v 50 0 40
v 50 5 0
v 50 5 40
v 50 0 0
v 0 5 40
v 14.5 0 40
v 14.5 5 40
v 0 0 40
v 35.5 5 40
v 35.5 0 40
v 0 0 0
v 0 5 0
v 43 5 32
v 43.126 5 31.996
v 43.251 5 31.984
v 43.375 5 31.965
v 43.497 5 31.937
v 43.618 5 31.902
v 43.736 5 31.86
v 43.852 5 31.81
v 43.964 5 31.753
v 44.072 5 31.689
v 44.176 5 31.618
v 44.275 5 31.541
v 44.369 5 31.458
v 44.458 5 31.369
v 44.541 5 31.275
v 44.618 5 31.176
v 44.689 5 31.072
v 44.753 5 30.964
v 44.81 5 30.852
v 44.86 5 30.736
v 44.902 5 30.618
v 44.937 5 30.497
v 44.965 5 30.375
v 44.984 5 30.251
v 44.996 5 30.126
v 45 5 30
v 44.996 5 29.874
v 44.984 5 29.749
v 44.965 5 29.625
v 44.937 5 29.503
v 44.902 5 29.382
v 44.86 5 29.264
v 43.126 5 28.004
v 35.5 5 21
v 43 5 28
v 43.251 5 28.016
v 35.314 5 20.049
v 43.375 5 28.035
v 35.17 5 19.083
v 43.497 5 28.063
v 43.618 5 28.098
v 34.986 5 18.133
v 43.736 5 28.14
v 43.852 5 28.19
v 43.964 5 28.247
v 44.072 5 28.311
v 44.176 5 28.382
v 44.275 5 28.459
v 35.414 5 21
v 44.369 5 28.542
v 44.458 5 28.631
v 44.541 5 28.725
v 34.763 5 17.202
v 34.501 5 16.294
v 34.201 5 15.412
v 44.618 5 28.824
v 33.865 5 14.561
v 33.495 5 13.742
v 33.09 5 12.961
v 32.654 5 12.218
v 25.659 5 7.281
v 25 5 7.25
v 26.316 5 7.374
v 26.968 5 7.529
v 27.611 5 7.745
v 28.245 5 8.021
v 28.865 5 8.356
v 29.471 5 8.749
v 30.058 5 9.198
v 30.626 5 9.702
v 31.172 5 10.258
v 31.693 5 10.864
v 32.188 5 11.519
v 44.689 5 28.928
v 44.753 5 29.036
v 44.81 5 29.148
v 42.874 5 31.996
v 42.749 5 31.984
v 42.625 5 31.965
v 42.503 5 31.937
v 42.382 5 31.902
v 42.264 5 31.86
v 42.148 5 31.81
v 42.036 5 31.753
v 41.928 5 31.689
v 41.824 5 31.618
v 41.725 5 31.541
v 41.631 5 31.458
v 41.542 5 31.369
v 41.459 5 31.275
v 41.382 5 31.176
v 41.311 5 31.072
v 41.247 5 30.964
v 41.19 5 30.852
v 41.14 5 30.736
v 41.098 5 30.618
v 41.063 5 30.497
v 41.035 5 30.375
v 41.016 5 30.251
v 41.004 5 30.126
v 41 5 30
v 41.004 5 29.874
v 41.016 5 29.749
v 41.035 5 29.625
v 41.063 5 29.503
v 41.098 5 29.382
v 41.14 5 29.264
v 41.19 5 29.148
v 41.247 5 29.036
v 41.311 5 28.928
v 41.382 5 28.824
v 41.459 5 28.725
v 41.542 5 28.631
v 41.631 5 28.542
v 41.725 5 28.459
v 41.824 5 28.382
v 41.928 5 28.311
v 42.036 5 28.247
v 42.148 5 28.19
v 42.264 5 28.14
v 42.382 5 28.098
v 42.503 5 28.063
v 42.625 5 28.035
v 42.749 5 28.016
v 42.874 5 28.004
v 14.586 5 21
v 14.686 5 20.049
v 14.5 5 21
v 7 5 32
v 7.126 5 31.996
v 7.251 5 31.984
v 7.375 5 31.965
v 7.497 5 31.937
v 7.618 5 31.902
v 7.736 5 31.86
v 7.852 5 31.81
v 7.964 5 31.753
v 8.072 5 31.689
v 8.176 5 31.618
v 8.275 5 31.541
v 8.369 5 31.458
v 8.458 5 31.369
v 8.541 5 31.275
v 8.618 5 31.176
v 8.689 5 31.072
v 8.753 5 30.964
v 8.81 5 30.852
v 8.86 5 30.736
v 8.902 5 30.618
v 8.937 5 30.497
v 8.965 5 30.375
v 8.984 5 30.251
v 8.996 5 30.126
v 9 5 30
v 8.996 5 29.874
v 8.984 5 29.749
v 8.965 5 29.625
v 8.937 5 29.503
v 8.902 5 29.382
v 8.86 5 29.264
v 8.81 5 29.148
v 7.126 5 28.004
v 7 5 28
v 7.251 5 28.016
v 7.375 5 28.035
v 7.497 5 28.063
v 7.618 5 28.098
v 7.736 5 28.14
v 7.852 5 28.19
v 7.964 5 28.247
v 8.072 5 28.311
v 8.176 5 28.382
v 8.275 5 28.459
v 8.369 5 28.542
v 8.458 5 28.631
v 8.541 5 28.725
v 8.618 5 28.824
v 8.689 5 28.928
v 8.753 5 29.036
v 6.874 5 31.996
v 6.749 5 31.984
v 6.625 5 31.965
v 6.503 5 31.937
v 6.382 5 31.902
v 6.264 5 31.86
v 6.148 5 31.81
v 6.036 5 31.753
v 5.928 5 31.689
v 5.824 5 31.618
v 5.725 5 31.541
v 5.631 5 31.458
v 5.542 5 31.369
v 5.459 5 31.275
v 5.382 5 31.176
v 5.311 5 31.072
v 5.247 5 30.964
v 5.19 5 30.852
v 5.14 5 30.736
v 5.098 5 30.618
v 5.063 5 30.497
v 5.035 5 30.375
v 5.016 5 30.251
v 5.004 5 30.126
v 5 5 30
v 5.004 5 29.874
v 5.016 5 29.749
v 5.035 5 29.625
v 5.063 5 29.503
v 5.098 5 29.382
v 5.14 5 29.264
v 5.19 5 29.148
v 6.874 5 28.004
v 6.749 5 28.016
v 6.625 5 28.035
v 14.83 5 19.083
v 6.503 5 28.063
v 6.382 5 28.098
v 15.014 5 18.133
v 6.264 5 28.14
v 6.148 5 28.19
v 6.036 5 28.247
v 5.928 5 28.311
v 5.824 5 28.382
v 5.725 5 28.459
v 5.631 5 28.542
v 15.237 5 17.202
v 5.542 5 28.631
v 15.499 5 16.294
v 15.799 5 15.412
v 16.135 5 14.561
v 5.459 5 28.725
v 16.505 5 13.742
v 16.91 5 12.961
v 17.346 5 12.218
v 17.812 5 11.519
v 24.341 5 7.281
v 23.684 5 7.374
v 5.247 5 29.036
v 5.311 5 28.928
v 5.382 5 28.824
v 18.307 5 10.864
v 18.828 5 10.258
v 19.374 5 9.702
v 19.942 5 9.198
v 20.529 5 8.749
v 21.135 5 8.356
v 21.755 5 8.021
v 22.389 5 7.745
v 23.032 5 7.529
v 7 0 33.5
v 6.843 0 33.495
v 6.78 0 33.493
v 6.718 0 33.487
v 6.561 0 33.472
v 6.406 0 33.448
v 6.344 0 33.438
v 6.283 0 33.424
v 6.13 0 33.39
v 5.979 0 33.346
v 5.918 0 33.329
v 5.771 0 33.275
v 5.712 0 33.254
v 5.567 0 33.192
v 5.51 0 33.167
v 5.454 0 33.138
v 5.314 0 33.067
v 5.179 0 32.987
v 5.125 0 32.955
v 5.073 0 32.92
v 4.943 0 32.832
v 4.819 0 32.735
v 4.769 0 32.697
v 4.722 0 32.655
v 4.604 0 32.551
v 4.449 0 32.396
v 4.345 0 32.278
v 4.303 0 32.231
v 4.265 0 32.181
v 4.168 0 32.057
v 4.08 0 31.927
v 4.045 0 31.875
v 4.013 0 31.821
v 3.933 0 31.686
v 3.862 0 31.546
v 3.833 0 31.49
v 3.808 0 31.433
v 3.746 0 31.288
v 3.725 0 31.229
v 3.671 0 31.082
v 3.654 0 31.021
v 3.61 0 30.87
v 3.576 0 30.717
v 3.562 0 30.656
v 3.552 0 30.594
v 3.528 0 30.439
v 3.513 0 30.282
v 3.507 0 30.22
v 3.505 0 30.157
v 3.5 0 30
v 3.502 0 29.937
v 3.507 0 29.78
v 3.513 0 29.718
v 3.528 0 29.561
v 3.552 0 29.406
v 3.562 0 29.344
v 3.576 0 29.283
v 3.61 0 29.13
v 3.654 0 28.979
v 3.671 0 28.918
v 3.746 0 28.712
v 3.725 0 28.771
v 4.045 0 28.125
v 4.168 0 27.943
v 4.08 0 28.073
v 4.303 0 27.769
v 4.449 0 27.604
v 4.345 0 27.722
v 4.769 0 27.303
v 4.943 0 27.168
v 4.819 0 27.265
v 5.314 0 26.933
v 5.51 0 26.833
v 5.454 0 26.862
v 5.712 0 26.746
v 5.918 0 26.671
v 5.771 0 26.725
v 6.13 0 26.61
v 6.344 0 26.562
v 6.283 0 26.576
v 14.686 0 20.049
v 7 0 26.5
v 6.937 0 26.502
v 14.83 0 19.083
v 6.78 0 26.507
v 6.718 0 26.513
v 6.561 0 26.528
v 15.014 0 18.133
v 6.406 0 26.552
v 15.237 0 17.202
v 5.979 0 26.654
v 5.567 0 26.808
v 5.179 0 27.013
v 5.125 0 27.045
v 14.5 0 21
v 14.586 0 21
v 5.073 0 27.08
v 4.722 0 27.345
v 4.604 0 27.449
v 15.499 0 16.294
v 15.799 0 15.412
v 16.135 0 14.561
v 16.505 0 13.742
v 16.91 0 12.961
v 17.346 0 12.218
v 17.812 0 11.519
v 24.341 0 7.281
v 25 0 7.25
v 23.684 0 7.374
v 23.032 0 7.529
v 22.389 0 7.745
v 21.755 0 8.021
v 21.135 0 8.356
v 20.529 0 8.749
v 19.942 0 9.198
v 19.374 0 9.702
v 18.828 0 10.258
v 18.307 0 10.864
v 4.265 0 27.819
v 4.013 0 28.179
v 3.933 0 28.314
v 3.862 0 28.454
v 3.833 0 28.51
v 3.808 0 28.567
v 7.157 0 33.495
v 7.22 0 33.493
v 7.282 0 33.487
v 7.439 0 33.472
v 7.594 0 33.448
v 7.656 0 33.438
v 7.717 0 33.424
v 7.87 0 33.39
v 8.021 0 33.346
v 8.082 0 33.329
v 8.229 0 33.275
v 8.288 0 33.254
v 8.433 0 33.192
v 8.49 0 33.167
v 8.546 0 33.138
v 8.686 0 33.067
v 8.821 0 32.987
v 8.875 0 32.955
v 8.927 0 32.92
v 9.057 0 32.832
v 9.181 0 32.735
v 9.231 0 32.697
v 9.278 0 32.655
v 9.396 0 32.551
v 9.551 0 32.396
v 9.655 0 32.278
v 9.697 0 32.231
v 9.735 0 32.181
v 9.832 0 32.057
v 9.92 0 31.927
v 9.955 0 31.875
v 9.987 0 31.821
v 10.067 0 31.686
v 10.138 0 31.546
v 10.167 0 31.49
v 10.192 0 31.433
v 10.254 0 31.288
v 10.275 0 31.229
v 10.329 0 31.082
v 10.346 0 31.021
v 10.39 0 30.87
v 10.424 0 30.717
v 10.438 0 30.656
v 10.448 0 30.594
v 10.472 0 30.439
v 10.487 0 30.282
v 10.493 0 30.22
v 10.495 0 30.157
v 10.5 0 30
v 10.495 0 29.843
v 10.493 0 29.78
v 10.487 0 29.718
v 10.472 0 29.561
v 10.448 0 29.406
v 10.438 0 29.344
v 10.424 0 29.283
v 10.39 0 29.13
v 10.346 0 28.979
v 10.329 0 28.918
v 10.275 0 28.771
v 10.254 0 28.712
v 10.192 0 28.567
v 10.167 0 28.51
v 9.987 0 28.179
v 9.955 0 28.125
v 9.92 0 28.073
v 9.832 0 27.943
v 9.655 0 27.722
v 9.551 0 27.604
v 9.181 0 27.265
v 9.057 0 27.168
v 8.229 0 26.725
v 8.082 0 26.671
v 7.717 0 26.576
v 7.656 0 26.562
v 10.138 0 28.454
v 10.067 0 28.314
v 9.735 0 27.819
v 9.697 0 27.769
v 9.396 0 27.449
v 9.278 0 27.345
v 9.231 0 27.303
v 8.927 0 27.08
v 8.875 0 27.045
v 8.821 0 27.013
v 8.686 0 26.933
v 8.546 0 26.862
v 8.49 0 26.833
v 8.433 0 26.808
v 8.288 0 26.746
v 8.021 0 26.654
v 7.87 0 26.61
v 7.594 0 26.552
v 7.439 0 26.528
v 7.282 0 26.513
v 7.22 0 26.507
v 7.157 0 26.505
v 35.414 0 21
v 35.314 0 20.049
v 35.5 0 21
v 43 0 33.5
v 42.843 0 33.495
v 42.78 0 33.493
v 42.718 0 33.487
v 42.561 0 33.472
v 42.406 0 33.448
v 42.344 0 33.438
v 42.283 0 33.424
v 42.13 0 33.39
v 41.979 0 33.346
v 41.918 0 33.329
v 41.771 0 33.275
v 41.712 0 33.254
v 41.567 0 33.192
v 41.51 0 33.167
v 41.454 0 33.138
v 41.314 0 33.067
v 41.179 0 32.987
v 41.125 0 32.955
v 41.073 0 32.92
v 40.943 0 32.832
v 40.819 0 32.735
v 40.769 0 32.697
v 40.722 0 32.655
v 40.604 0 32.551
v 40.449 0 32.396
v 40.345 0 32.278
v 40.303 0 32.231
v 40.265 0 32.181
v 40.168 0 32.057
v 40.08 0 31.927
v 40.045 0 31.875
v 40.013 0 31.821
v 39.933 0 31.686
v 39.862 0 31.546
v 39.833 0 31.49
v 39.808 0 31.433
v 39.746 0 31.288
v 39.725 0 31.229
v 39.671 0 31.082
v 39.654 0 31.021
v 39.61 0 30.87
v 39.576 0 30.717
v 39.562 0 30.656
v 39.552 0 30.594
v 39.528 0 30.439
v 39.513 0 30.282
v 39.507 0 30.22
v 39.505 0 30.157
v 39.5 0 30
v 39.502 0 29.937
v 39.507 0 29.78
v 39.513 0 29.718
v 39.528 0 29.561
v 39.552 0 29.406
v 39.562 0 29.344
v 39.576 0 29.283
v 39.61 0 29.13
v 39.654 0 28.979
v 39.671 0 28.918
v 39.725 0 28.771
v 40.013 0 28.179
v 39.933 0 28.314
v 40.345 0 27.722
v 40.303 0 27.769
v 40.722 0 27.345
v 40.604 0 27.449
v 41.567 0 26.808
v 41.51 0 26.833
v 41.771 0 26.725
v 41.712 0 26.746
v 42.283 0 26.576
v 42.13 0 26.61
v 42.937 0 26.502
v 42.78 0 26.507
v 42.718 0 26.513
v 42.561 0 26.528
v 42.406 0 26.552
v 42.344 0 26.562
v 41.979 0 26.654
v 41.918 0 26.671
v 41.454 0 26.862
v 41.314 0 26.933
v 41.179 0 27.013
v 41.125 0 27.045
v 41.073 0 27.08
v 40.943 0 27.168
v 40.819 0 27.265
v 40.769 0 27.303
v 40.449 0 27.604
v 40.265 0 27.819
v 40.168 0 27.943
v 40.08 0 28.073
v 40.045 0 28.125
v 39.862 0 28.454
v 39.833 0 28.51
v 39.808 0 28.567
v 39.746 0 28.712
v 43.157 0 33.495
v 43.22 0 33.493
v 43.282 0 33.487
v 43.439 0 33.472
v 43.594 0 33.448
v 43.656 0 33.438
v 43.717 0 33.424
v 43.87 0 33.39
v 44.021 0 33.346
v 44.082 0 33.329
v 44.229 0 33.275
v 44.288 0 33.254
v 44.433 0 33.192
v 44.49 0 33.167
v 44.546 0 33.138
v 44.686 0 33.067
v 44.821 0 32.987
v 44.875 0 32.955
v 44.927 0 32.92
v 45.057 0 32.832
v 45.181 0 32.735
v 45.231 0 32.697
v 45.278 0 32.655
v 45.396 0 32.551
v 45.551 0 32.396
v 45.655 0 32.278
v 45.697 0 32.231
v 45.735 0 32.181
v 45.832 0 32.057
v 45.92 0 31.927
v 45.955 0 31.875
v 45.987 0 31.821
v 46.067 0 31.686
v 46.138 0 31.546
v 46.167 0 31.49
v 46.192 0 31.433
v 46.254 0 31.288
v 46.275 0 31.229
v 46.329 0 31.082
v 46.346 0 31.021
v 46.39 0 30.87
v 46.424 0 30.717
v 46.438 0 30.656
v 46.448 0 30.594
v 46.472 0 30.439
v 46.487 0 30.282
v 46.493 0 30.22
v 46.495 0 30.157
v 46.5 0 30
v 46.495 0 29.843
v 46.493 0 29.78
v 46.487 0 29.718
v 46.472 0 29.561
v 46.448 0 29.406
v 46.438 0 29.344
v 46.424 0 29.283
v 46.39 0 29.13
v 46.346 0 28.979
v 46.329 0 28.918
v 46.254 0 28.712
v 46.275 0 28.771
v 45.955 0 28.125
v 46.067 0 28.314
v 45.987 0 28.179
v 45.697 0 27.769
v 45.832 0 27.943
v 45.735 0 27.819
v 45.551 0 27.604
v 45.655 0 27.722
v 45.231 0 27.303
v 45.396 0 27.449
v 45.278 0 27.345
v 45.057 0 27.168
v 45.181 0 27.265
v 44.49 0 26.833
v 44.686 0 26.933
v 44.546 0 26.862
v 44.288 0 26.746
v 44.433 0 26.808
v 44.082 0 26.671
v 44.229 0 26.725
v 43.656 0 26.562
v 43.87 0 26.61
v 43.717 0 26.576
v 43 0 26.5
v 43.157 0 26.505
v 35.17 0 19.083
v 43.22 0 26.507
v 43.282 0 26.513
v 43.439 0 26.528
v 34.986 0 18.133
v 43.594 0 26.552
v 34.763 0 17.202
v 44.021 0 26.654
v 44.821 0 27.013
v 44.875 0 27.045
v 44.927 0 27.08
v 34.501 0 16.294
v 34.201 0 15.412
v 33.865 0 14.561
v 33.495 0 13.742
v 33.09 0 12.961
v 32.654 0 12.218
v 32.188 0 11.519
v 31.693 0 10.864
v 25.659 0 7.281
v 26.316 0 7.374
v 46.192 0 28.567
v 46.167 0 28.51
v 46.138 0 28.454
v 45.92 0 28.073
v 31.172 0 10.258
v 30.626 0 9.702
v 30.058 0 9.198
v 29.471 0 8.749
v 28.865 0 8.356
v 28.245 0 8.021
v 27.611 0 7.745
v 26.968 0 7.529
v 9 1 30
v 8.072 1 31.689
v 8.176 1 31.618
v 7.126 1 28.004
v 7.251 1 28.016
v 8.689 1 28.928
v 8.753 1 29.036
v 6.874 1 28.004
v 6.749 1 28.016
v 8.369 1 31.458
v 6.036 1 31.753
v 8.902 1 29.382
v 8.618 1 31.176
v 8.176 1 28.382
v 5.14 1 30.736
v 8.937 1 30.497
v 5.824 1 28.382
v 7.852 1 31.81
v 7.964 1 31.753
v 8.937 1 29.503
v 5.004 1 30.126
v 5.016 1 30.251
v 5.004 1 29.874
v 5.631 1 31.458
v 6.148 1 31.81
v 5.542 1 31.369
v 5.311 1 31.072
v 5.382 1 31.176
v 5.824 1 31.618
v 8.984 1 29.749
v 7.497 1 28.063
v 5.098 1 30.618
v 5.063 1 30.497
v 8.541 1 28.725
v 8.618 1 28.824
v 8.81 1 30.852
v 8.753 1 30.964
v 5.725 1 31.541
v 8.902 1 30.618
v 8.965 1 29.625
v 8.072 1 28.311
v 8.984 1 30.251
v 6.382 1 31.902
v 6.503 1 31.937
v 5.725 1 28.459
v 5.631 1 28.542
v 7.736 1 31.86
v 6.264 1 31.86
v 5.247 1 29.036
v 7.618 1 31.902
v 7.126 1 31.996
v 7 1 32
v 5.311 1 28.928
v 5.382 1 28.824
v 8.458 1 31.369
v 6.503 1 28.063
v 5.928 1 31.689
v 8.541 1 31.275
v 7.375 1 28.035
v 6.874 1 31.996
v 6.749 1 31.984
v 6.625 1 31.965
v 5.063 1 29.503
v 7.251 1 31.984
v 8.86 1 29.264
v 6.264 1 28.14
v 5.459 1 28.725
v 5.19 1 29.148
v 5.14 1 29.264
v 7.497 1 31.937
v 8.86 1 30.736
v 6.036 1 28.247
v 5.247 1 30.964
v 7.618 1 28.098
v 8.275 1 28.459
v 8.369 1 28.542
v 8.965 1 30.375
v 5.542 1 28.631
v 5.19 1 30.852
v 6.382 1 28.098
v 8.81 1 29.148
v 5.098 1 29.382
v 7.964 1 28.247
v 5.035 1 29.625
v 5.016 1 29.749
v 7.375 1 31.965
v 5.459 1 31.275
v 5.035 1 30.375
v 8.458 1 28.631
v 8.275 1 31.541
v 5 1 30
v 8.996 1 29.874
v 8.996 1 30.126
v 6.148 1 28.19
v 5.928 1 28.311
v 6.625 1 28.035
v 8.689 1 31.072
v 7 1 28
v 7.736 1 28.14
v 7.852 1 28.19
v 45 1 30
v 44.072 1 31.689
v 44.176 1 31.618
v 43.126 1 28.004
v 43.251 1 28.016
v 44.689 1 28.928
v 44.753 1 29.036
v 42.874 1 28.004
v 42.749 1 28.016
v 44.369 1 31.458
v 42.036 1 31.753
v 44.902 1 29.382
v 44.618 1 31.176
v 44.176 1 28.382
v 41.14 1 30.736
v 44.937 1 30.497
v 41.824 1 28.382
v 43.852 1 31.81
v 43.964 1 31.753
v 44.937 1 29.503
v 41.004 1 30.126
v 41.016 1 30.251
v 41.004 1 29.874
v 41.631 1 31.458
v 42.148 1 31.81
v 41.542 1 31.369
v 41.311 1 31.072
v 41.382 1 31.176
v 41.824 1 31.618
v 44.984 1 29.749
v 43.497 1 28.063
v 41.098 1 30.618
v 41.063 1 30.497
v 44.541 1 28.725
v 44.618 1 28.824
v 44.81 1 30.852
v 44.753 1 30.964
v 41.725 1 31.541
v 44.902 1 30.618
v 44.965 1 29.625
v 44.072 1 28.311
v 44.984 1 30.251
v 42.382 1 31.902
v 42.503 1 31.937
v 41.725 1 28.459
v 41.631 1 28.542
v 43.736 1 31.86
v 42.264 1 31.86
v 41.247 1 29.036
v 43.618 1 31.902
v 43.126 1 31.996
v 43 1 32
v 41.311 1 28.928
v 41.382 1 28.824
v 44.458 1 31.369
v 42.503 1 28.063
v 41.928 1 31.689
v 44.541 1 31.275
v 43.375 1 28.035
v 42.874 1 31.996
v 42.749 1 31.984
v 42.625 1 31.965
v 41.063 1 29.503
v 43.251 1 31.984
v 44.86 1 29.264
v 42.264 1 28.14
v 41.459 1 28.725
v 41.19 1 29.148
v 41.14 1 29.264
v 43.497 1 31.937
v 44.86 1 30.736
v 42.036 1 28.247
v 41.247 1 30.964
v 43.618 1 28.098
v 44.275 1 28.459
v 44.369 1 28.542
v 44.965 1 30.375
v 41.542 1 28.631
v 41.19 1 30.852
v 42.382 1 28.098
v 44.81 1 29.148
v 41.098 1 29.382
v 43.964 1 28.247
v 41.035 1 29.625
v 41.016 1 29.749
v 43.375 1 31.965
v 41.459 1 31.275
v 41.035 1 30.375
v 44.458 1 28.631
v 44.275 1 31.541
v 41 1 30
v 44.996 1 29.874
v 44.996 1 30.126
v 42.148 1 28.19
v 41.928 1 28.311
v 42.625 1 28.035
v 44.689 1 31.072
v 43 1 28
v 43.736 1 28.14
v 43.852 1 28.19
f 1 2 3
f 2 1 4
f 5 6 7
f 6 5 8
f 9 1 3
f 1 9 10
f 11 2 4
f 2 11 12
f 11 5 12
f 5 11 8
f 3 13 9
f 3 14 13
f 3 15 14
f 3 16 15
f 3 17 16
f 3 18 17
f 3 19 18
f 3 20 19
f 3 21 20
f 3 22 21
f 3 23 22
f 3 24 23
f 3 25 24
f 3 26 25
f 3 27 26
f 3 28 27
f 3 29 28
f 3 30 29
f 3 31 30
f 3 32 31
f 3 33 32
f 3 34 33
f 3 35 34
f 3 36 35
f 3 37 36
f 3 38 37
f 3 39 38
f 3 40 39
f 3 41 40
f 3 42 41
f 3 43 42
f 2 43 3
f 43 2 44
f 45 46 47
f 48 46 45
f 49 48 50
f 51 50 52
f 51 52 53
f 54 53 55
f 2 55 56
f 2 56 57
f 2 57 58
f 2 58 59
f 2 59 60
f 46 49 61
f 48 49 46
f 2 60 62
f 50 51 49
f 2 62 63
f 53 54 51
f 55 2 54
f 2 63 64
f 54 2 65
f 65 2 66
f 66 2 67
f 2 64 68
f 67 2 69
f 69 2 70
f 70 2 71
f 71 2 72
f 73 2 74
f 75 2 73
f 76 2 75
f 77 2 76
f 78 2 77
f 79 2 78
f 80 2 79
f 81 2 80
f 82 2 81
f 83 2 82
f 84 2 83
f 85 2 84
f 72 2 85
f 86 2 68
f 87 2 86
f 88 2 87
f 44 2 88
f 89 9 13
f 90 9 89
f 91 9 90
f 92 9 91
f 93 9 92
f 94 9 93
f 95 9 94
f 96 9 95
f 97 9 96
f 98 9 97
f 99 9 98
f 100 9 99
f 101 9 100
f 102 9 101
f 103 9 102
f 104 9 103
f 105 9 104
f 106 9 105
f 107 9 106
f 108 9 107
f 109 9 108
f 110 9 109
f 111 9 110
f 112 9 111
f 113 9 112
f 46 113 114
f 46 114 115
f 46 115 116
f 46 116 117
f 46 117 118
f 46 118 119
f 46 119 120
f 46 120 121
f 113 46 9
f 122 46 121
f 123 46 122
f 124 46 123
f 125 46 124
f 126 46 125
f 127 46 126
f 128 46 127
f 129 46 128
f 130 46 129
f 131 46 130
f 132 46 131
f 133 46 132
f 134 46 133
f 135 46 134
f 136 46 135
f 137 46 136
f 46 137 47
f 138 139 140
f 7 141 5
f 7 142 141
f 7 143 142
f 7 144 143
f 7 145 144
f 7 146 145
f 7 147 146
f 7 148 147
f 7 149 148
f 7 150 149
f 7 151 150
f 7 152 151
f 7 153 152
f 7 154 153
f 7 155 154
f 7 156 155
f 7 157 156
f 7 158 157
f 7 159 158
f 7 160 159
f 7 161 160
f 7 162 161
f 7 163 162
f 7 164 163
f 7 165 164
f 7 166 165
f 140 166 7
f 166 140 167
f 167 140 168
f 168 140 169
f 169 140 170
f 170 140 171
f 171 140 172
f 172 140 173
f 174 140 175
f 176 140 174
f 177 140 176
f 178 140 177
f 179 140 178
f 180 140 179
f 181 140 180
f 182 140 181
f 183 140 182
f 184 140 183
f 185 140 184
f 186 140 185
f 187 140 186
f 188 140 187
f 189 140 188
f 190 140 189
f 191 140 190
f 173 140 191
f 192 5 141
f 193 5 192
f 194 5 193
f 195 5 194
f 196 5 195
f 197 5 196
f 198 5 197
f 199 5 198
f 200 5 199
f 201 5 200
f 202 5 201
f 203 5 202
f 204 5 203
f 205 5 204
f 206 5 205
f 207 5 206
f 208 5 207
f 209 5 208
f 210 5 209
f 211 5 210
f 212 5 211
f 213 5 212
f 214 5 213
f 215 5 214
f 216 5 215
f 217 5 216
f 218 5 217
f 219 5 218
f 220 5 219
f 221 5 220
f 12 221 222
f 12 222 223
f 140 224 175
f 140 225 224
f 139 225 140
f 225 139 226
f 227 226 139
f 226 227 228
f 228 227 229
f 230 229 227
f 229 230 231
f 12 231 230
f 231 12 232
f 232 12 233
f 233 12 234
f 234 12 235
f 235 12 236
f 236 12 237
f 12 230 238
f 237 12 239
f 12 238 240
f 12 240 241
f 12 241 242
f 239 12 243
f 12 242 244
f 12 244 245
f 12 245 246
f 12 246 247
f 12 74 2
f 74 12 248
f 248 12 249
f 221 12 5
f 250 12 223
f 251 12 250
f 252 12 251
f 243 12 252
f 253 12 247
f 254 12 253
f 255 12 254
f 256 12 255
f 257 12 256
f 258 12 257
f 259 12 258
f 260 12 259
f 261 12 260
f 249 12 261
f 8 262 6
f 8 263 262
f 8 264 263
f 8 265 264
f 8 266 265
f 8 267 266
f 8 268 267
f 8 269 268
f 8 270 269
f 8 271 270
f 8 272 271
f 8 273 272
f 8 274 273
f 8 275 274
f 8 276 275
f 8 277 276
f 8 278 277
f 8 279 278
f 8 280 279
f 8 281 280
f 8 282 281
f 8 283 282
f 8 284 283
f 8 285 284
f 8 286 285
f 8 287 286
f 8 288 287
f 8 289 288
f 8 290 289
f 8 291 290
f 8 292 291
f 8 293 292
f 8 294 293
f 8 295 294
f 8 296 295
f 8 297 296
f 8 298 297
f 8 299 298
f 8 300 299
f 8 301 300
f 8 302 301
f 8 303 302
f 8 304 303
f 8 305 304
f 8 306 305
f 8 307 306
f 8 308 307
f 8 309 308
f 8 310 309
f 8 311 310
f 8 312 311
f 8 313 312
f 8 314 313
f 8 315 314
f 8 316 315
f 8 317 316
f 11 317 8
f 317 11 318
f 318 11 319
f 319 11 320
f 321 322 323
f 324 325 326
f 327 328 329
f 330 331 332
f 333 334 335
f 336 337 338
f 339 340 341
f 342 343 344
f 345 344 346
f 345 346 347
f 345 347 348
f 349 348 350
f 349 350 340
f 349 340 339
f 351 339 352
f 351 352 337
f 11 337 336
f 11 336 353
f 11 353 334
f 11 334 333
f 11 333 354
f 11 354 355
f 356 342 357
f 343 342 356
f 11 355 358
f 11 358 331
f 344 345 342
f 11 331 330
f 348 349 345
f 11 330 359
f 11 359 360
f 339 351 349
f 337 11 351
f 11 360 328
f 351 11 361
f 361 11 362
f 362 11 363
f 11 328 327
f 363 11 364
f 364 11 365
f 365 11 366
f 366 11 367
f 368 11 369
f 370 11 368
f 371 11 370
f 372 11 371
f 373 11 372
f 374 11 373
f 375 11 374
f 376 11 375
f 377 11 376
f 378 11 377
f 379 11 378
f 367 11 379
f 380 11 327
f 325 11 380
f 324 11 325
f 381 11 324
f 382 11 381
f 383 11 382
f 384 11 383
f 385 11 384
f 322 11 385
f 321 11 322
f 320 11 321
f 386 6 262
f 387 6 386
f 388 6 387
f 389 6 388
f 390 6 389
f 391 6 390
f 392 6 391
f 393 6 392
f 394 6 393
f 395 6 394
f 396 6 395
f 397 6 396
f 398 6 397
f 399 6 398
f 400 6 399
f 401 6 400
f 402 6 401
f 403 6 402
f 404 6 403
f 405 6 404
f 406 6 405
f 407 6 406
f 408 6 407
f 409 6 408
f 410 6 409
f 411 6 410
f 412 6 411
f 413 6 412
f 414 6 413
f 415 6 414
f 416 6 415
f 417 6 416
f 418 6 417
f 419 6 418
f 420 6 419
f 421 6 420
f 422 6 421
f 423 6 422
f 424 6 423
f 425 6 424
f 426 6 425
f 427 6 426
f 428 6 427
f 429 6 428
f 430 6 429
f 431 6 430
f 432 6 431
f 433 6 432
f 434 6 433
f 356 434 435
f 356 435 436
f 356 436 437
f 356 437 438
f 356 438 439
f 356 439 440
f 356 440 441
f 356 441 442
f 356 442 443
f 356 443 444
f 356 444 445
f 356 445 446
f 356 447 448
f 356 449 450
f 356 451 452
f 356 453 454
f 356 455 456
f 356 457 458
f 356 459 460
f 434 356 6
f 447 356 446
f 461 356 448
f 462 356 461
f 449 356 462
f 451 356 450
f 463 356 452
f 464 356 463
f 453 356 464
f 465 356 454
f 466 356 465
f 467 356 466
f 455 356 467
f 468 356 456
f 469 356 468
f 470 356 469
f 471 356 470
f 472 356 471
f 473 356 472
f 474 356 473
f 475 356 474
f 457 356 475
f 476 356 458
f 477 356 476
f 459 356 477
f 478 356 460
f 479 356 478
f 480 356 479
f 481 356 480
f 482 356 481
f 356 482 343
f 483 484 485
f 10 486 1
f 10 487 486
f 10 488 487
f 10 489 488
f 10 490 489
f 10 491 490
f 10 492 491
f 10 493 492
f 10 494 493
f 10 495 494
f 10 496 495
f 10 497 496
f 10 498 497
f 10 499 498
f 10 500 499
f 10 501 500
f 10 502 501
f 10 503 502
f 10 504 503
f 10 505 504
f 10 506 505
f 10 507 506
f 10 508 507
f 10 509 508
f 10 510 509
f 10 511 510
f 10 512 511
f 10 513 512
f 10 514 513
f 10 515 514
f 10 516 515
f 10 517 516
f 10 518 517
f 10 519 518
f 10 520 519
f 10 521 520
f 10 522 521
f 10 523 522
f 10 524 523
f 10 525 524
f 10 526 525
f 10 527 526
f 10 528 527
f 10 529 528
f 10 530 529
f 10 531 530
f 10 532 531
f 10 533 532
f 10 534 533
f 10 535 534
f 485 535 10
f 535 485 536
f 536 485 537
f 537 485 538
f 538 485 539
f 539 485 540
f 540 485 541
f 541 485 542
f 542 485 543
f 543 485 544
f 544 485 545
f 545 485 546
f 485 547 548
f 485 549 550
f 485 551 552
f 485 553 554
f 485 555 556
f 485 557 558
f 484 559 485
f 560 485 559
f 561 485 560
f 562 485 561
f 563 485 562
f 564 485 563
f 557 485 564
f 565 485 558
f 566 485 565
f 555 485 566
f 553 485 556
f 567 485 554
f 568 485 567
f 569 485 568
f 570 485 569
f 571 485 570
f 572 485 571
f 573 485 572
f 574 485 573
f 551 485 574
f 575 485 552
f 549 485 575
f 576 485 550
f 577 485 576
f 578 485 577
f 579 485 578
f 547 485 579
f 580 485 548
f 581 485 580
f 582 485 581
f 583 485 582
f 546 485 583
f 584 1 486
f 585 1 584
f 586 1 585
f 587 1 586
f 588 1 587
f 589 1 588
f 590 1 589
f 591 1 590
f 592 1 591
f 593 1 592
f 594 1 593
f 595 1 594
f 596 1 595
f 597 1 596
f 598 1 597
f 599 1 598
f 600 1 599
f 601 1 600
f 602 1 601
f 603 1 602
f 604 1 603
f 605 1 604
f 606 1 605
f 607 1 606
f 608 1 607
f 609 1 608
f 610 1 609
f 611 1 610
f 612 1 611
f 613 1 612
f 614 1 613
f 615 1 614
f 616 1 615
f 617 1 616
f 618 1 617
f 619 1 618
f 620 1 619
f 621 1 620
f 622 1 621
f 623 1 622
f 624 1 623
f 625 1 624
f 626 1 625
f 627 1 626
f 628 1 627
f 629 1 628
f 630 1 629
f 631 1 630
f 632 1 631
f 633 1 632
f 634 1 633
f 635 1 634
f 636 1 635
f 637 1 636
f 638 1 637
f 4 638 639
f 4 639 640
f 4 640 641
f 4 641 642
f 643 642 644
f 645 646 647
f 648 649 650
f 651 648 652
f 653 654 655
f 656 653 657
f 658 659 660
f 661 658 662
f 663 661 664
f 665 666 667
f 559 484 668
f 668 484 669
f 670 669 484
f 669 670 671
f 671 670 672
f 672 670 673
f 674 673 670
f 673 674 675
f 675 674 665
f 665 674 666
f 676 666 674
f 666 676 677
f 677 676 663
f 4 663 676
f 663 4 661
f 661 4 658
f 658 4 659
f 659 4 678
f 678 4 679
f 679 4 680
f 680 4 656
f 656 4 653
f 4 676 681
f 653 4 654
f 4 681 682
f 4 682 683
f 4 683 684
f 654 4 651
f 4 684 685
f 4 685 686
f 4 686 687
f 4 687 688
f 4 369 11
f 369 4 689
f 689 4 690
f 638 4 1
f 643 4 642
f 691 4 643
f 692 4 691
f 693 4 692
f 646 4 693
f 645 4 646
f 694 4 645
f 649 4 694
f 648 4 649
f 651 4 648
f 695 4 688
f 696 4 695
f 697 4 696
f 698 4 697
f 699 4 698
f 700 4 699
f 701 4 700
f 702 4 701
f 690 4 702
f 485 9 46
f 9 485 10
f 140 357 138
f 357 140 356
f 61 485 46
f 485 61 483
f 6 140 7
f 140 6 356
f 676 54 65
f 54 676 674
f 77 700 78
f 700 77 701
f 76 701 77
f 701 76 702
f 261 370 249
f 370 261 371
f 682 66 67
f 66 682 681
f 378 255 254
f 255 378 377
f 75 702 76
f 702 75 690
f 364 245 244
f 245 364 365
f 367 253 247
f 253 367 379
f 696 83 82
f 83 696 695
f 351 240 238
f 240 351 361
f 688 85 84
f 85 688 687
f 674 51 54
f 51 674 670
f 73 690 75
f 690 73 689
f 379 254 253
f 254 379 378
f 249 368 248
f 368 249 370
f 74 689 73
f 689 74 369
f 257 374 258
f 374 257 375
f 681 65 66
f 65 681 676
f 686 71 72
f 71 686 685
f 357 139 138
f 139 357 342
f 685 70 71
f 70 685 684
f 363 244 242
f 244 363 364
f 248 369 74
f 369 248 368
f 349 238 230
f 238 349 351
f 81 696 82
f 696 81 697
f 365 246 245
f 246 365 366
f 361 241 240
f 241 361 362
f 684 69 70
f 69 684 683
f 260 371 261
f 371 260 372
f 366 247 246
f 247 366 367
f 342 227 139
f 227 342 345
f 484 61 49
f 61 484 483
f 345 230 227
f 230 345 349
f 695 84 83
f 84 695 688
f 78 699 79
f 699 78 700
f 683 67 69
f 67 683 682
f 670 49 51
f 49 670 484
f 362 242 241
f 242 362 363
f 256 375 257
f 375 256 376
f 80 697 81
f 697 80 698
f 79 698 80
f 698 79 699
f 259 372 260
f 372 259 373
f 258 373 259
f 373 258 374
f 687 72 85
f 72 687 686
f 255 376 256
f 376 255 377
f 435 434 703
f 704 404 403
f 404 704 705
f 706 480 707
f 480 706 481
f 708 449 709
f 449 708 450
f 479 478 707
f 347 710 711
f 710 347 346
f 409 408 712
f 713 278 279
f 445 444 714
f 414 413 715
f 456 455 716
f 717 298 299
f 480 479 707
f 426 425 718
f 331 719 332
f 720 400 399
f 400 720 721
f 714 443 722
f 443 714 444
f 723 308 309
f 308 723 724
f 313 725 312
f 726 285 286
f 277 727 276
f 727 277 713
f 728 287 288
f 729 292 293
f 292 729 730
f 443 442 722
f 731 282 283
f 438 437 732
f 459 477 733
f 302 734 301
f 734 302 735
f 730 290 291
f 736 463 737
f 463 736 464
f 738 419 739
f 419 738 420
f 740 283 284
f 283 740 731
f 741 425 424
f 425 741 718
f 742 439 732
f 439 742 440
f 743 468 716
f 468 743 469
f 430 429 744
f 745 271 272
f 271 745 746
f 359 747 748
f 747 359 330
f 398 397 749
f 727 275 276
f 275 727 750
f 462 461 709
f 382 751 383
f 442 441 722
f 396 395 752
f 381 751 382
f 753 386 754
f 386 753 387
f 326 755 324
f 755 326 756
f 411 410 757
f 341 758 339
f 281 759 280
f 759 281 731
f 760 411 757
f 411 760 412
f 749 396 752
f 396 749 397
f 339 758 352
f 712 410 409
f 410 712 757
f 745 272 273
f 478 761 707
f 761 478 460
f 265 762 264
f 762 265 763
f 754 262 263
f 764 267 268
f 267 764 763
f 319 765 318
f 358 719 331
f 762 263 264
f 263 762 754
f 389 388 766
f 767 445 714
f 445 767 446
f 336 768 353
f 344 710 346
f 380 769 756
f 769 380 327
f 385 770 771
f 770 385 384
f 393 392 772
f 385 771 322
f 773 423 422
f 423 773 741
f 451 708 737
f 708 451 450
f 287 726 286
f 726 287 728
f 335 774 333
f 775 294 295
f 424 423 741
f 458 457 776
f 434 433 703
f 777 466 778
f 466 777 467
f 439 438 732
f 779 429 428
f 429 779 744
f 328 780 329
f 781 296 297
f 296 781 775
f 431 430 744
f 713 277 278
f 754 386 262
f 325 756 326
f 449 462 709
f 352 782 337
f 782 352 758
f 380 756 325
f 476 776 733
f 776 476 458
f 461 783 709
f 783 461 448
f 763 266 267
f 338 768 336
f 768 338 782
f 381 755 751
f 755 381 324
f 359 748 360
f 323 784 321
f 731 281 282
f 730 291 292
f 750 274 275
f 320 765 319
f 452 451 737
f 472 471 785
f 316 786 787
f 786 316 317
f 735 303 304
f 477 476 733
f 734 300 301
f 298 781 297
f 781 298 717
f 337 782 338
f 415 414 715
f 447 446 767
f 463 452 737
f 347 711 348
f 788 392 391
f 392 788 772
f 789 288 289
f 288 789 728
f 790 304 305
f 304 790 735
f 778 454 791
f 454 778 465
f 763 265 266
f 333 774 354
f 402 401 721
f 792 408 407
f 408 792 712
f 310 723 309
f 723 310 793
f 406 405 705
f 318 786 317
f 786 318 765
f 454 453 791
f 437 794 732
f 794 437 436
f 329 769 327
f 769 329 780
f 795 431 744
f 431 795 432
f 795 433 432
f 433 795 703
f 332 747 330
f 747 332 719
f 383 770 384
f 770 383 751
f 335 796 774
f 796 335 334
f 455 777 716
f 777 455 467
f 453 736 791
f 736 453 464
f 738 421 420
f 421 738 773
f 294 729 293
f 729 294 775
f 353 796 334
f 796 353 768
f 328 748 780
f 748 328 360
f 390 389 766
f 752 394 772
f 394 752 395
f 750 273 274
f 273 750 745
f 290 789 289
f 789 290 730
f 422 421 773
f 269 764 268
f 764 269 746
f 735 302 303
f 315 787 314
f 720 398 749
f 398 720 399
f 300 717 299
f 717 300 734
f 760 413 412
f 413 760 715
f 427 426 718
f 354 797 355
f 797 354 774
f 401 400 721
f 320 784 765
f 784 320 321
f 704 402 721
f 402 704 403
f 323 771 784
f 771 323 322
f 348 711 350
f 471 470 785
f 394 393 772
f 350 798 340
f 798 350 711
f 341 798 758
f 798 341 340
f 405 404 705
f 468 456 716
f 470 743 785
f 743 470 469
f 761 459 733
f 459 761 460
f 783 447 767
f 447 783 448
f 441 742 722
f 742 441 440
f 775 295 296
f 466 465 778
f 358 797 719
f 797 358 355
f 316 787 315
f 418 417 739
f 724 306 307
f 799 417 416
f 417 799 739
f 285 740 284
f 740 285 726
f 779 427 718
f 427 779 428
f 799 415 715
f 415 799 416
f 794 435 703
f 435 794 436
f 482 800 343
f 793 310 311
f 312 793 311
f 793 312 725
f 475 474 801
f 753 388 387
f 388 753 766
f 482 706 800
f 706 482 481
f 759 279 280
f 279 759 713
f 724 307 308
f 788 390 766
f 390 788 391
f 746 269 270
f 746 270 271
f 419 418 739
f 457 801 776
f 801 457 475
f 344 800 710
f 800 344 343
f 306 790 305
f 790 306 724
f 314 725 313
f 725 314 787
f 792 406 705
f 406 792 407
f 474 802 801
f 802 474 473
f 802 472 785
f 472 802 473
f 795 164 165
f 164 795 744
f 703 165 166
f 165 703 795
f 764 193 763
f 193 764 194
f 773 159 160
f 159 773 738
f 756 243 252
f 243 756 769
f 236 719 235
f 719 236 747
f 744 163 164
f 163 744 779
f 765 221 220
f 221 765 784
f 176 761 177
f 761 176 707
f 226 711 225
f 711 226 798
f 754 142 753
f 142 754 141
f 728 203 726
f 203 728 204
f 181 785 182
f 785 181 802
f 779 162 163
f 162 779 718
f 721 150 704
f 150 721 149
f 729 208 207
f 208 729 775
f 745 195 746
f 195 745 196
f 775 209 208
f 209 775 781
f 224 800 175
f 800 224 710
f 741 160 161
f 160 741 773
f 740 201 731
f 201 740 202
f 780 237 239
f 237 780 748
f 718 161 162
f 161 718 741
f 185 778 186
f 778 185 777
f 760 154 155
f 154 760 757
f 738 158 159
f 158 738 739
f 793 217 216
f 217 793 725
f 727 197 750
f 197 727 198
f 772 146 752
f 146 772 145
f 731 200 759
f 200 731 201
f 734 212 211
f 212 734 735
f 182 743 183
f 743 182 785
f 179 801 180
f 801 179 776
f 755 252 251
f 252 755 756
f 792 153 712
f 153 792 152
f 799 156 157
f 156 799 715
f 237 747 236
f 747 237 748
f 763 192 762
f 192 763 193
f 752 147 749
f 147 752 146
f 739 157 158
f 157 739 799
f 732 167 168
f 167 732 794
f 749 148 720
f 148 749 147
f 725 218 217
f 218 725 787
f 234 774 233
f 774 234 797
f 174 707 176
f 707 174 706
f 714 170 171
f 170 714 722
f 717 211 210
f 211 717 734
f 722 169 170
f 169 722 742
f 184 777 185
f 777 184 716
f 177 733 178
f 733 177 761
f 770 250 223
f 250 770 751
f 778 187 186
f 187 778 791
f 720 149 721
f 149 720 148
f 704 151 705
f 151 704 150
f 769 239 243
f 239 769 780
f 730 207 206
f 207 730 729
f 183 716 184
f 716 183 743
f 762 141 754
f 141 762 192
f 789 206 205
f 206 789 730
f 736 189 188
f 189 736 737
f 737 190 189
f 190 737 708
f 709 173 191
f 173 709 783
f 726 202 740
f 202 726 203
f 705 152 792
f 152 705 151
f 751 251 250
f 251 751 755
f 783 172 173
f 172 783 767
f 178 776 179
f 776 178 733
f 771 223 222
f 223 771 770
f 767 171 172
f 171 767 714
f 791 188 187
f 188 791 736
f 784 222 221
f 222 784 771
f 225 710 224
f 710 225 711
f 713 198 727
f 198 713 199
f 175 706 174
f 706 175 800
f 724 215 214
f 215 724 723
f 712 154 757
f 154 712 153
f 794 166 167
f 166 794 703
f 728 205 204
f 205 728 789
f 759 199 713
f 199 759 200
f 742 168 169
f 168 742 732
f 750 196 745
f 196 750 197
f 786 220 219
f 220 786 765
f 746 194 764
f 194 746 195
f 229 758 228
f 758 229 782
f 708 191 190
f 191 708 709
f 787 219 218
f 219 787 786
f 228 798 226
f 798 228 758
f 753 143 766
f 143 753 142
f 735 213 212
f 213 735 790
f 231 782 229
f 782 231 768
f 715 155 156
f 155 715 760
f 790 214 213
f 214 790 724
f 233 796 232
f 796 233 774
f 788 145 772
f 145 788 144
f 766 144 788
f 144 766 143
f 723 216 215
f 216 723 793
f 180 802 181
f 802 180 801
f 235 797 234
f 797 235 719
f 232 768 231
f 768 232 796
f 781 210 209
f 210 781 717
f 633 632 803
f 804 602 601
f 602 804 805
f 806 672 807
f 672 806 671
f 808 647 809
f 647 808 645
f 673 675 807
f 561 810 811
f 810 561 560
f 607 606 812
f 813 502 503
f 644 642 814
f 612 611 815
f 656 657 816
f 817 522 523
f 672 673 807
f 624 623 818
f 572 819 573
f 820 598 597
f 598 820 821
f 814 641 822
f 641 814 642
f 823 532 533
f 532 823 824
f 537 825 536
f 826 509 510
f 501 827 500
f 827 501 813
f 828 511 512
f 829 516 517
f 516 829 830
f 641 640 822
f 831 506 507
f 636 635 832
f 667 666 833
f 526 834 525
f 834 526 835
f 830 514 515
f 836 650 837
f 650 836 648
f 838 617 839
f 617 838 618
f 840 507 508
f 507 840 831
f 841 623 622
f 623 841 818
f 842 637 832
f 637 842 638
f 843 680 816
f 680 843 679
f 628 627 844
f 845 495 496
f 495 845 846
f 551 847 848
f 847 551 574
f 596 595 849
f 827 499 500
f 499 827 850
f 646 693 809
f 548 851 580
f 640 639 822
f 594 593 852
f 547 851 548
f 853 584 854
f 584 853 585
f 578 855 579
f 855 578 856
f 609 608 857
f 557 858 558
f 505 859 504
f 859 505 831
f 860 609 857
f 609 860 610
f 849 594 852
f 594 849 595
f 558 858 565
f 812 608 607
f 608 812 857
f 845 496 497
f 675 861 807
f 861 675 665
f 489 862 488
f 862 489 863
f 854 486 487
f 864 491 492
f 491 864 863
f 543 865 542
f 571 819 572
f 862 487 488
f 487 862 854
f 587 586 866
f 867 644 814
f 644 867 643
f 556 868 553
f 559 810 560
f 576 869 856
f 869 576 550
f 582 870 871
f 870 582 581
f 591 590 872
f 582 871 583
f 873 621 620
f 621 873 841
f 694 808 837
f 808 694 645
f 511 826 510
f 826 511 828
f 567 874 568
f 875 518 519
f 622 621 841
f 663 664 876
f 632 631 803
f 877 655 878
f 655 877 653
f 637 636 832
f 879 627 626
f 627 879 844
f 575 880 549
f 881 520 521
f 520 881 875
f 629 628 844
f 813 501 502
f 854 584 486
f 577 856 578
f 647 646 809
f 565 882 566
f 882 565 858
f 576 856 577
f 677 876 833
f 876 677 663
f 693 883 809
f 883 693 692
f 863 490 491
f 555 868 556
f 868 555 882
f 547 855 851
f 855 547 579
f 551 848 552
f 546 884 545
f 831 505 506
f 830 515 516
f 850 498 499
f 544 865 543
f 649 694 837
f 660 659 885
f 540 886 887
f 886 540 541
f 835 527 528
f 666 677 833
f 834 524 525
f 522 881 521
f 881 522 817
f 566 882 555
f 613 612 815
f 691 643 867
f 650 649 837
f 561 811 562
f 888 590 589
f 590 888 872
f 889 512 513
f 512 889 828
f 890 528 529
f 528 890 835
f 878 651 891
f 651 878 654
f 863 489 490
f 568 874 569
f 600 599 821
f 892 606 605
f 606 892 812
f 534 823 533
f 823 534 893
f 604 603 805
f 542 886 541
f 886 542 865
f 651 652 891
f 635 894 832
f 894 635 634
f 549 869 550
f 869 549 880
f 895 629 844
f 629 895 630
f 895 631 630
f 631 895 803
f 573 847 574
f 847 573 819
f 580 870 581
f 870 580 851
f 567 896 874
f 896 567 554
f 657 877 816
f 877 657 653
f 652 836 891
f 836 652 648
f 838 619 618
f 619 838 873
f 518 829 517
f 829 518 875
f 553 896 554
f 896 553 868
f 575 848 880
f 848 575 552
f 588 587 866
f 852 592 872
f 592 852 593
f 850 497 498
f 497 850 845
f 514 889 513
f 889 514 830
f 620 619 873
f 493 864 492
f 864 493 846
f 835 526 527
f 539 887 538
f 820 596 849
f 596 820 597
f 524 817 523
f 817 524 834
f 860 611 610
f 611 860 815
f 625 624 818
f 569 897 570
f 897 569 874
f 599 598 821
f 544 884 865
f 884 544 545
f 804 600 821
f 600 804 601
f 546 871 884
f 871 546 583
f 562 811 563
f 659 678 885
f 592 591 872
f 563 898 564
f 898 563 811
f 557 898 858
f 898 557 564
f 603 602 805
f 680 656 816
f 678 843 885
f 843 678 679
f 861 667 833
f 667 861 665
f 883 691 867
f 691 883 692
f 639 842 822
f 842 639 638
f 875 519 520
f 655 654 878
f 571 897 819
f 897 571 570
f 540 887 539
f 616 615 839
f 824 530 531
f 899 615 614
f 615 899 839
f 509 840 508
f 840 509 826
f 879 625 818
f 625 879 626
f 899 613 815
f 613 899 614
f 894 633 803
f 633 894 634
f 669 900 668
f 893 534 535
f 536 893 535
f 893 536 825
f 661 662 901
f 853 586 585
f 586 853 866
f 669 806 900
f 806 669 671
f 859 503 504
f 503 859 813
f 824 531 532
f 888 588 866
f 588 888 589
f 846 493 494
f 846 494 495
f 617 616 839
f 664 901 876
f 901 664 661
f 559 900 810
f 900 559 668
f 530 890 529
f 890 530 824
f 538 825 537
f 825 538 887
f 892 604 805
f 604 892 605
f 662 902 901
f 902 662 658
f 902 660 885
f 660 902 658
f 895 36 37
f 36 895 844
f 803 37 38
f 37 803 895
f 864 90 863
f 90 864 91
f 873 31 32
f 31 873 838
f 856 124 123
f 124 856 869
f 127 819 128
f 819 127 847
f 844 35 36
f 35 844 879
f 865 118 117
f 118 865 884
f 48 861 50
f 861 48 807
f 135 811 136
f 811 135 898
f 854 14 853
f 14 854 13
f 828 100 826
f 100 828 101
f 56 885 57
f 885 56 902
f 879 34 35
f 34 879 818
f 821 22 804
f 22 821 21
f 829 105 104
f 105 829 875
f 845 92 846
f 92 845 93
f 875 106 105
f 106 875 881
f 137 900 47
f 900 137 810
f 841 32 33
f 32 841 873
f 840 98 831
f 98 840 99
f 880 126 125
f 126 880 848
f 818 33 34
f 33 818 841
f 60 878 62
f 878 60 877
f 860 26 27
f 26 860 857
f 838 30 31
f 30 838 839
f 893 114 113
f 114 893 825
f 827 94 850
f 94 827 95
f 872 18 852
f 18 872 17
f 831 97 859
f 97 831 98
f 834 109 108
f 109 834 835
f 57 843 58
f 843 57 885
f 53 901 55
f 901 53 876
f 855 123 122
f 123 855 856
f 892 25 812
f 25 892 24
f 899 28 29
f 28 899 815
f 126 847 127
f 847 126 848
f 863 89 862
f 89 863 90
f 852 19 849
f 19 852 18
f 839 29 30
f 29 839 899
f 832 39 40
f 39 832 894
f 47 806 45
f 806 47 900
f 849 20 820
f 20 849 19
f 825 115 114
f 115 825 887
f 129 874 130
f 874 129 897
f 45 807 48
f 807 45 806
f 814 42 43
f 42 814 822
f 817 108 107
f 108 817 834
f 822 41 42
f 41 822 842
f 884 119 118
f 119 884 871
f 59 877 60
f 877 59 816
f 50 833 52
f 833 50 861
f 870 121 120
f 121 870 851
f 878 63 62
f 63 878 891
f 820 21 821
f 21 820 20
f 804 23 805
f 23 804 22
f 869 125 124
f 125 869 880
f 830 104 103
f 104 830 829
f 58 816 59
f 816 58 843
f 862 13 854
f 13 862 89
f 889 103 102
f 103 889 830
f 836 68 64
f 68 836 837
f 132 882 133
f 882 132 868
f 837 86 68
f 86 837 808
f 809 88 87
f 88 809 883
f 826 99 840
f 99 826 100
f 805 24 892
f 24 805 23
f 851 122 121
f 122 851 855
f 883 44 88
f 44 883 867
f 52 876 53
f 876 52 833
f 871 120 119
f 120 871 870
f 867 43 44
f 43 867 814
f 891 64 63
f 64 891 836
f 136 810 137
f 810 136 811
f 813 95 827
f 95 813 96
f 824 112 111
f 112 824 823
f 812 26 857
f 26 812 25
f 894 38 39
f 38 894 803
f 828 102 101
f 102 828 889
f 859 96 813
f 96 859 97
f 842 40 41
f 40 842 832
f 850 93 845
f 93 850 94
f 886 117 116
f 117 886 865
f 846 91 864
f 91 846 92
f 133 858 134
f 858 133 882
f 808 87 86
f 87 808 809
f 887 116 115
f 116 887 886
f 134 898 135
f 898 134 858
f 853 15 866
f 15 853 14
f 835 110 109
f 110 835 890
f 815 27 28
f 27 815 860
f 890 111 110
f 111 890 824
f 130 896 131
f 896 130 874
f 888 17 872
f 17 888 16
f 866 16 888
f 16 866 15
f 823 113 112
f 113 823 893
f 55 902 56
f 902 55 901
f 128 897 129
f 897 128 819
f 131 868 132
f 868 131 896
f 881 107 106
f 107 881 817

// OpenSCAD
//--------------------------------------------------------------
// Name: Wardrobe_leg_holder.scad
// Version: 0.9
// Purpose: Wardrobe leg holder
// Author: Evgeny Klepikov
// E-mail: klek07@ya.ru
//
// Created: 28.12.2017
// Updated: 20.02.2018
// Copyright: (c) 2017-2018 WildFox24
// Licence: GPL v3
//--------------------------------------------------------------
//
Ws=5;
Wd=50;
Wd1=21;
Ht=40;
Dc=21;
$fn=100;
module WardrobLegHolder() {
    difference() {
        translate([0,0,0]) cube([Wd,Ws,Ht], false);
        #translate([Wd/2-Wd1/2,-2,Wd1]) cube([Wd1,Ws+5,Ht+1]);
        translate([Wd/2,Ws+2,Wd1+2]) rotate([90,0,0]) scale([1,1.5,1]) cylinder(d=Dc, h=Ws+10);
    }
}
module ScrewHole(hx,hy,hz) {
  translate([hx,hy-hy-1,hz]) rotate([-90,0,0]) cylinder(d1=10, d2=4, h=2);
  translate([hx,hy,hz]) rotate([90,0,0]) cylinder(d=4, h=Ws+10);
}
difference() {
  WardrobLegHolder();
  ScrewHole(7,10,30);
  ScrewHole(43,10,30);
}
